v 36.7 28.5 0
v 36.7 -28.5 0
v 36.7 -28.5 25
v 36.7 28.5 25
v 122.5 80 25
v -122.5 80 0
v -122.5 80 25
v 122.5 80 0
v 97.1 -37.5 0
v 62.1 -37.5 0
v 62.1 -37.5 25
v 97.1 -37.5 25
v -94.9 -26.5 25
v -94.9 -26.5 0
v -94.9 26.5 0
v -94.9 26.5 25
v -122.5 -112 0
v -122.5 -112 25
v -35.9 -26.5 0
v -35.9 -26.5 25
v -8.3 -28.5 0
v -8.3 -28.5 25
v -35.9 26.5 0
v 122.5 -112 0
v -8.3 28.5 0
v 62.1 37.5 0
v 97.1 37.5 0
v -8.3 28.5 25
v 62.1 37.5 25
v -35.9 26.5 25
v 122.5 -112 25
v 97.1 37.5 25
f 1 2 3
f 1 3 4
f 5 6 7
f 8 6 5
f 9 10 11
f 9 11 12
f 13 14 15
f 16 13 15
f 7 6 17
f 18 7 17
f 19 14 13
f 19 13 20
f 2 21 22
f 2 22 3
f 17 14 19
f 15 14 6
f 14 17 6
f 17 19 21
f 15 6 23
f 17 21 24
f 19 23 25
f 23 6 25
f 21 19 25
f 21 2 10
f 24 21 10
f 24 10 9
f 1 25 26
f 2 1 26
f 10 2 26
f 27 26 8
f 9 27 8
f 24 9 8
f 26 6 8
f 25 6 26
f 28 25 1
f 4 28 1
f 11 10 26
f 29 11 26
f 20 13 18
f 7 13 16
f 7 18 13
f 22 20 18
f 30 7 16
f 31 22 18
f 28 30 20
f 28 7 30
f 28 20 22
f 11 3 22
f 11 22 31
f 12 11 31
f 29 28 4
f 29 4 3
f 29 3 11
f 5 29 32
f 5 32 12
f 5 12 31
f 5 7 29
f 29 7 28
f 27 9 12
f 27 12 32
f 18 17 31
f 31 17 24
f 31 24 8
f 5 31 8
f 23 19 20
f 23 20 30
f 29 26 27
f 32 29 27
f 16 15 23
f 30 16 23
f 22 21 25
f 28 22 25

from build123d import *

# Parameters (mm, degrees)
F0_W     = 245
F0_H     = 160
F0_W_2   = 59
F0_H_2   = 53
F0_W_3   = 45
F0_H_3   = 57
F0_W_4   = 35
F0_H_4   = 75
F0_H_5   = 32
F1_DEPTH = 25


with BuildPart() as f1:
    # F0 (on Top) → F1 (new body)
    with BuildSketch(Plane.XY):
        Rectangle(F0_W, F0_H)
        with Locations((-65.4, 0)):
            Rectangle(F0_W_2, F0_H_2, mode=Mode.SUBTRACT)
        with Locations((14.2, 0)):
            Rectangle(F0_W_3, F0_H_3, mode=Mode.SUBTRACT)
        with Locations((79.6, 0)):
            Rectangle(F0_W_4, F0_H_4, mode=Mode.SUBTRACT)
        with Locations((0, -96)):
            Rectangle(F0_W, F0_H_5)
    extrude(amount=F1_DEPTH)


solid = f1.part
